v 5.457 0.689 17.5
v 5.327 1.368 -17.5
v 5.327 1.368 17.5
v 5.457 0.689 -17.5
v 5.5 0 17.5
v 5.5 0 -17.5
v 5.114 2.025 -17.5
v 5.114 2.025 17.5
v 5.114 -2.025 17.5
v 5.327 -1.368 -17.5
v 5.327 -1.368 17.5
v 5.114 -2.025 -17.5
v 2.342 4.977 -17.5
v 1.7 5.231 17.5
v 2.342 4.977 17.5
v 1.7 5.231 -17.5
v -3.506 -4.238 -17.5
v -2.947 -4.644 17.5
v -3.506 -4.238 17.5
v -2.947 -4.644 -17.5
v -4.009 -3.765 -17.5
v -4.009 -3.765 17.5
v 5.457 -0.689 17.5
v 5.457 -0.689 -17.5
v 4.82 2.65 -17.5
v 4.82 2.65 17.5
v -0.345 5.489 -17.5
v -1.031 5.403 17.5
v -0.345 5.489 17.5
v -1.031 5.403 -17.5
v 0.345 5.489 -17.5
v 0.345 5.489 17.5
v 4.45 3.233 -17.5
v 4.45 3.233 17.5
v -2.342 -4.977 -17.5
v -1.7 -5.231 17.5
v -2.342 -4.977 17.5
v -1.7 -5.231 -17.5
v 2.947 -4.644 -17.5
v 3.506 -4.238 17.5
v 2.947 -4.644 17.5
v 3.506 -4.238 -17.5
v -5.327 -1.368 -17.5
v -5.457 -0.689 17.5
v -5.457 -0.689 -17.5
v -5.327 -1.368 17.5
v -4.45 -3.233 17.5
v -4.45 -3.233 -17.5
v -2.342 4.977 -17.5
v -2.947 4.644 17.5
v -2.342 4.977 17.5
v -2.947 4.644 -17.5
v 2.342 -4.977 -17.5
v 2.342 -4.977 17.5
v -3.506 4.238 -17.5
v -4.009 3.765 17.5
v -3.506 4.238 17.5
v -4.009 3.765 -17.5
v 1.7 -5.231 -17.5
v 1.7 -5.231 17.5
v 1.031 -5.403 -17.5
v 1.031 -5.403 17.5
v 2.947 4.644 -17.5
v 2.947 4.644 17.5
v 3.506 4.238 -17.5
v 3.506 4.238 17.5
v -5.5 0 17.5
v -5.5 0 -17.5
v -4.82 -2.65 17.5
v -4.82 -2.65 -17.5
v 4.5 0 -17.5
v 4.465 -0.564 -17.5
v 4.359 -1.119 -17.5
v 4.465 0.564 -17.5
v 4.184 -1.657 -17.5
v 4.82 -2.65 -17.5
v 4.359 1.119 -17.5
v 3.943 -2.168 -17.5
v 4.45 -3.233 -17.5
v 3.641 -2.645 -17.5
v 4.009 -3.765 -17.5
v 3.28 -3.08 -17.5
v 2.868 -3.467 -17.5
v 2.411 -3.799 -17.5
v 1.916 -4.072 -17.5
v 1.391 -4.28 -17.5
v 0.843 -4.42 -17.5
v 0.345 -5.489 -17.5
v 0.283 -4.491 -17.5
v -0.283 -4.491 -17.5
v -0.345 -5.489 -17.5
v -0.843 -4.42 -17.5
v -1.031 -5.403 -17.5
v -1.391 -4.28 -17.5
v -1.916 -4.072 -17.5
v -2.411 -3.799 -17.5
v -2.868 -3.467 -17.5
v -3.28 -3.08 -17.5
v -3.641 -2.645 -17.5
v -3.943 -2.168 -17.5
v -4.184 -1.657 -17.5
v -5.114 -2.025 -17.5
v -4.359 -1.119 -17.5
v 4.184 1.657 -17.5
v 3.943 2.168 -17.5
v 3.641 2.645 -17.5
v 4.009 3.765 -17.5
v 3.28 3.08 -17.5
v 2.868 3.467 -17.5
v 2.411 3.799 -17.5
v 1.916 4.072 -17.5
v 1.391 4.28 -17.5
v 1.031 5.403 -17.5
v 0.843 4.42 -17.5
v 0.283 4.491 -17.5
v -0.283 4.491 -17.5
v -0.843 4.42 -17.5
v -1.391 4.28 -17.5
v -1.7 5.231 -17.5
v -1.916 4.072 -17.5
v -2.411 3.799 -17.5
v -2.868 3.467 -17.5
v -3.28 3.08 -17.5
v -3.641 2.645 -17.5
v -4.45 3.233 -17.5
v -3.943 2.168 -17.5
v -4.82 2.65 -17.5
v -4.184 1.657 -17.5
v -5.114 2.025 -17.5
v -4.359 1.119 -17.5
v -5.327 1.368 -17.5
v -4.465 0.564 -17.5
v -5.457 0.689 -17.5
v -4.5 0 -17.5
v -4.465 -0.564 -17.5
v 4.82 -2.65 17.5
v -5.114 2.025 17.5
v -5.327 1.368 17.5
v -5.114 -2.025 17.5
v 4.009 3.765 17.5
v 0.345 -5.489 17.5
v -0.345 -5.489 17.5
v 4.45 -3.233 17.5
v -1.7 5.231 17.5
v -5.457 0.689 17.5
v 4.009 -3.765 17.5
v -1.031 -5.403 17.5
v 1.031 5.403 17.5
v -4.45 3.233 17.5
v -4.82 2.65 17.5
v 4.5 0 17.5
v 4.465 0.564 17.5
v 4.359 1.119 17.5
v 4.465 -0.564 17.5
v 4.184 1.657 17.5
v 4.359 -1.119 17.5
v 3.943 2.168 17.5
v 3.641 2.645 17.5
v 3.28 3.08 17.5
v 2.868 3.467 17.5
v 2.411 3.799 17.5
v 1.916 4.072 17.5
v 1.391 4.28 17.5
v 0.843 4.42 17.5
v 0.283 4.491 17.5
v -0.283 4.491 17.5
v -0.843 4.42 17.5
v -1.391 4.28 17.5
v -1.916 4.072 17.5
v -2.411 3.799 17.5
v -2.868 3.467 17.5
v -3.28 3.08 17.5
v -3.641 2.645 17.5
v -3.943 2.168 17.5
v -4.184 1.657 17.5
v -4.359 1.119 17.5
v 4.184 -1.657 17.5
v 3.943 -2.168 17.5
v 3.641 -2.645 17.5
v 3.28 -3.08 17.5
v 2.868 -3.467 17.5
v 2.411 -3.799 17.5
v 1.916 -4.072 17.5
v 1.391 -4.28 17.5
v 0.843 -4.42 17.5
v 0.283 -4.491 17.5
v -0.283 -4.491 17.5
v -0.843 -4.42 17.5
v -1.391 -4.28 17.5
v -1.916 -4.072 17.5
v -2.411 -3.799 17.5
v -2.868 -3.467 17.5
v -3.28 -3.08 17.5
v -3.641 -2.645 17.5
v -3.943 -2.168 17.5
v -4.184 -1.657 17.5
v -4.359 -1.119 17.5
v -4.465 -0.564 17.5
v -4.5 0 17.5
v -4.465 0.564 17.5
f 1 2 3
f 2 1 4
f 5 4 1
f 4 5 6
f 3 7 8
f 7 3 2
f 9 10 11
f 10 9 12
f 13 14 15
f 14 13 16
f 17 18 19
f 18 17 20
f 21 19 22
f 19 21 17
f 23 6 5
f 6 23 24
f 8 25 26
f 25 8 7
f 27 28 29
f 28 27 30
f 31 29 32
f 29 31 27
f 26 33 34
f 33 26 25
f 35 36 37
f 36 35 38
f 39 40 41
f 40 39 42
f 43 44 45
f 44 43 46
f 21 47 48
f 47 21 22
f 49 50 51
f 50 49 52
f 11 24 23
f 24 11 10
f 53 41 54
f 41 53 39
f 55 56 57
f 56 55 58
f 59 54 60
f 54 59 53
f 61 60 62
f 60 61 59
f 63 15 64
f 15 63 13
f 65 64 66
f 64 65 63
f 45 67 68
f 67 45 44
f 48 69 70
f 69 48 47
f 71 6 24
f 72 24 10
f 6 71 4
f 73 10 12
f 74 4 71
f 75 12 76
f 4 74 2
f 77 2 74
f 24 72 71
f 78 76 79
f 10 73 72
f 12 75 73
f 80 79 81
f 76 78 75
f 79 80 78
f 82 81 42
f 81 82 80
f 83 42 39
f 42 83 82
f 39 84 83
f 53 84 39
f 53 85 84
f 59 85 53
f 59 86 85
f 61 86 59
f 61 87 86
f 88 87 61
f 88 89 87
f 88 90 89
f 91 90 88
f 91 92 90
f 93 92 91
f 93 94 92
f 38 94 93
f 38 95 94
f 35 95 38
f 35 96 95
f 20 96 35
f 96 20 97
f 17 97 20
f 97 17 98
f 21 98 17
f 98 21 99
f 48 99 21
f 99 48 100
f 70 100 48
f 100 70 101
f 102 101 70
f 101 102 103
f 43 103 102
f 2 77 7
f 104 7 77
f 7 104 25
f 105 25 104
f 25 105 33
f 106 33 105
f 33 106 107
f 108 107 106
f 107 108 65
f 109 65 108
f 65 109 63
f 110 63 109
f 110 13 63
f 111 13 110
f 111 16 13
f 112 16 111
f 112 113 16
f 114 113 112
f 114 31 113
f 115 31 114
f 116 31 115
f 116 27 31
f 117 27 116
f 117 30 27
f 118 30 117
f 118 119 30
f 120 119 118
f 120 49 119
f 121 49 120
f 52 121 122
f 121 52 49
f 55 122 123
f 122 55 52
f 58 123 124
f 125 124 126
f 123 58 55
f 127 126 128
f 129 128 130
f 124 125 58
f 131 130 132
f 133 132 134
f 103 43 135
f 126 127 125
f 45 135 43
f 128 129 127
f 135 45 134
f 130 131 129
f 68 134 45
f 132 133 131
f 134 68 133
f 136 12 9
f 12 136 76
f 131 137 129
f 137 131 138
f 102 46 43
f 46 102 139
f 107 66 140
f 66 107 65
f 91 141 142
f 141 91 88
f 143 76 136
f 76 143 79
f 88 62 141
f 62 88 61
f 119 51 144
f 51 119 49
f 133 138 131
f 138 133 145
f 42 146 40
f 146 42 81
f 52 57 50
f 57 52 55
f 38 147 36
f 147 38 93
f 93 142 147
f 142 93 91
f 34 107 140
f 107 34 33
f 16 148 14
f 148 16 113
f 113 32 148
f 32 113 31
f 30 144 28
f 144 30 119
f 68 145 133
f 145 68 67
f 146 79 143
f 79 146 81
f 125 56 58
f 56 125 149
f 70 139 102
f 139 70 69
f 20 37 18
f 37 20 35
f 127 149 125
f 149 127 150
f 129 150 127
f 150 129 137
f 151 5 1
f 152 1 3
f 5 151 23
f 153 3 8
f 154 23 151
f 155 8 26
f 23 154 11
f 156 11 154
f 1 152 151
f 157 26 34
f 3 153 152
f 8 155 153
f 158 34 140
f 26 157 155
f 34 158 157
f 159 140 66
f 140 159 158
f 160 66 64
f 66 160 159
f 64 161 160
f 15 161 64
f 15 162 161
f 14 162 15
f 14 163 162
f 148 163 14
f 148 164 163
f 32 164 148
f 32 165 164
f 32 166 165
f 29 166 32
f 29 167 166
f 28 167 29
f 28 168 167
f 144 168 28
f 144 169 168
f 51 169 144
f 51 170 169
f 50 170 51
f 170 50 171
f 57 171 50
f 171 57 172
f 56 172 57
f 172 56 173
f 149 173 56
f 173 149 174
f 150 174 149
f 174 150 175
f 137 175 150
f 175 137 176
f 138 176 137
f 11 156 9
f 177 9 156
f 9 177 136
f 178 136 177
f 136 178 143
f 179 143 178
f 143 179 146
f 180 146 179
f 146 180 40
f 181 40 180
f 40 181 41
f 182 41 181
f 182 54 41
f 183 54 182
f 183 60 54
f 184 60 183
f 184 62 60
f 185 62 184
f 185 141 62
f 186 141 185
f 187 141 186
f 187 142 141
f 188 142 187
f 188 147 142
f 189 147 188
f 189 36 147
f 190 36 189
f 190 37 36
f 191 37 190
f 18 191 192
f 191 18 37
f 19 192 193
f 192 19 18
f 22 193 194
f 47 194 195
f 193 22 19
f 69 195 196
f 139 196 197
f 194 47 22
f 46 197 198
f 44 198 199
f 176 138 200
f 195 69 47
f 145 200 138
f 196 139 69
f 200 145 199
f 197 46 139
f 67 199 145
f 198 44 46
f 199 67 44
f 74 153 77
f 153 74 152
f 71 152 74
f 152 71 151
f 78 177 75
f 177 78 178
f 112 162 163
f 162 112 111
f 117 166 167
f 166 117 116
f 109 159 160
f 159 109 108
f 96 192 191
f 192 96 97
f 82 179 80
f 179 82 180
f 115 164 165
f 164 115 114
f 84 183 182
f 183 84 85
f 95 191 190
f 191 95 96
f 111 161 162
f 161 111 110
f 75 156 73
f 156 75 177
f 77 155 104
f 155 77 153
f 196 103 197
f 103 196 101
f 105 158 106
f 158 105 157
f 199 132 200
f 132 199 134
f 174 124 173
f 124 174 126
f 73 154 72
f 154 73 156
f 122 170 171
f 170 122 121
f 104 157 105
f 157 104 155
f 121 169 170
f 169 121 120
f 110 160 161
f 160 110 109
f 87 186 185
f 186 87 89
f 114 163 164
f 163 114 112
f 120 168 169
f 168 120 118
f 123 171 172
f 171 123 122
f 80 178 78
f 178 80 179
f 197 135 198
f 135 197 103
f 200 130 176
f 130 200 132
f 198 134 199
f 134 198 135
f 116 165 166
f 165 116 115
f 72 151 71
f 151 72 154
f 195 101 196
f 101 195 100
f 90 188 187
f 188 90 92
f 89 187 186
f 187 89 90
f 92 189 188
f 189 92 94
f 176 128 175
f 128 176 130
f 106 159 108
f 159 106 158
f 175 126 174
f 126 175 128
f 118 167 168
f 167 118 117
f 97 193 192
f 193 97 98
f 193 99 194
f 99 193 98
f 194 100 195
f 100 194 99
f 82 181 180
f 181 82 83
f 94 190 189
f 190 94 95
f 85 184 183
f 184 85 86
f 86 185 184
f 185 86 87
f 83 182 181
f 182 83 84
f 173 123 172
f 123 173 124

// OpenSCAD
$fn = 50;


difference() {
	union() {
		translate(v = [0, 0, -17.5000000000]) {
			cylinder(h = 35, r = 5.5000000000);
		}
	}
	union() {
		translate(v = [0, 0, -100.0000000000]) {
			cylinder(h = 200, r = 4.5000000000);
		}
	}
}
